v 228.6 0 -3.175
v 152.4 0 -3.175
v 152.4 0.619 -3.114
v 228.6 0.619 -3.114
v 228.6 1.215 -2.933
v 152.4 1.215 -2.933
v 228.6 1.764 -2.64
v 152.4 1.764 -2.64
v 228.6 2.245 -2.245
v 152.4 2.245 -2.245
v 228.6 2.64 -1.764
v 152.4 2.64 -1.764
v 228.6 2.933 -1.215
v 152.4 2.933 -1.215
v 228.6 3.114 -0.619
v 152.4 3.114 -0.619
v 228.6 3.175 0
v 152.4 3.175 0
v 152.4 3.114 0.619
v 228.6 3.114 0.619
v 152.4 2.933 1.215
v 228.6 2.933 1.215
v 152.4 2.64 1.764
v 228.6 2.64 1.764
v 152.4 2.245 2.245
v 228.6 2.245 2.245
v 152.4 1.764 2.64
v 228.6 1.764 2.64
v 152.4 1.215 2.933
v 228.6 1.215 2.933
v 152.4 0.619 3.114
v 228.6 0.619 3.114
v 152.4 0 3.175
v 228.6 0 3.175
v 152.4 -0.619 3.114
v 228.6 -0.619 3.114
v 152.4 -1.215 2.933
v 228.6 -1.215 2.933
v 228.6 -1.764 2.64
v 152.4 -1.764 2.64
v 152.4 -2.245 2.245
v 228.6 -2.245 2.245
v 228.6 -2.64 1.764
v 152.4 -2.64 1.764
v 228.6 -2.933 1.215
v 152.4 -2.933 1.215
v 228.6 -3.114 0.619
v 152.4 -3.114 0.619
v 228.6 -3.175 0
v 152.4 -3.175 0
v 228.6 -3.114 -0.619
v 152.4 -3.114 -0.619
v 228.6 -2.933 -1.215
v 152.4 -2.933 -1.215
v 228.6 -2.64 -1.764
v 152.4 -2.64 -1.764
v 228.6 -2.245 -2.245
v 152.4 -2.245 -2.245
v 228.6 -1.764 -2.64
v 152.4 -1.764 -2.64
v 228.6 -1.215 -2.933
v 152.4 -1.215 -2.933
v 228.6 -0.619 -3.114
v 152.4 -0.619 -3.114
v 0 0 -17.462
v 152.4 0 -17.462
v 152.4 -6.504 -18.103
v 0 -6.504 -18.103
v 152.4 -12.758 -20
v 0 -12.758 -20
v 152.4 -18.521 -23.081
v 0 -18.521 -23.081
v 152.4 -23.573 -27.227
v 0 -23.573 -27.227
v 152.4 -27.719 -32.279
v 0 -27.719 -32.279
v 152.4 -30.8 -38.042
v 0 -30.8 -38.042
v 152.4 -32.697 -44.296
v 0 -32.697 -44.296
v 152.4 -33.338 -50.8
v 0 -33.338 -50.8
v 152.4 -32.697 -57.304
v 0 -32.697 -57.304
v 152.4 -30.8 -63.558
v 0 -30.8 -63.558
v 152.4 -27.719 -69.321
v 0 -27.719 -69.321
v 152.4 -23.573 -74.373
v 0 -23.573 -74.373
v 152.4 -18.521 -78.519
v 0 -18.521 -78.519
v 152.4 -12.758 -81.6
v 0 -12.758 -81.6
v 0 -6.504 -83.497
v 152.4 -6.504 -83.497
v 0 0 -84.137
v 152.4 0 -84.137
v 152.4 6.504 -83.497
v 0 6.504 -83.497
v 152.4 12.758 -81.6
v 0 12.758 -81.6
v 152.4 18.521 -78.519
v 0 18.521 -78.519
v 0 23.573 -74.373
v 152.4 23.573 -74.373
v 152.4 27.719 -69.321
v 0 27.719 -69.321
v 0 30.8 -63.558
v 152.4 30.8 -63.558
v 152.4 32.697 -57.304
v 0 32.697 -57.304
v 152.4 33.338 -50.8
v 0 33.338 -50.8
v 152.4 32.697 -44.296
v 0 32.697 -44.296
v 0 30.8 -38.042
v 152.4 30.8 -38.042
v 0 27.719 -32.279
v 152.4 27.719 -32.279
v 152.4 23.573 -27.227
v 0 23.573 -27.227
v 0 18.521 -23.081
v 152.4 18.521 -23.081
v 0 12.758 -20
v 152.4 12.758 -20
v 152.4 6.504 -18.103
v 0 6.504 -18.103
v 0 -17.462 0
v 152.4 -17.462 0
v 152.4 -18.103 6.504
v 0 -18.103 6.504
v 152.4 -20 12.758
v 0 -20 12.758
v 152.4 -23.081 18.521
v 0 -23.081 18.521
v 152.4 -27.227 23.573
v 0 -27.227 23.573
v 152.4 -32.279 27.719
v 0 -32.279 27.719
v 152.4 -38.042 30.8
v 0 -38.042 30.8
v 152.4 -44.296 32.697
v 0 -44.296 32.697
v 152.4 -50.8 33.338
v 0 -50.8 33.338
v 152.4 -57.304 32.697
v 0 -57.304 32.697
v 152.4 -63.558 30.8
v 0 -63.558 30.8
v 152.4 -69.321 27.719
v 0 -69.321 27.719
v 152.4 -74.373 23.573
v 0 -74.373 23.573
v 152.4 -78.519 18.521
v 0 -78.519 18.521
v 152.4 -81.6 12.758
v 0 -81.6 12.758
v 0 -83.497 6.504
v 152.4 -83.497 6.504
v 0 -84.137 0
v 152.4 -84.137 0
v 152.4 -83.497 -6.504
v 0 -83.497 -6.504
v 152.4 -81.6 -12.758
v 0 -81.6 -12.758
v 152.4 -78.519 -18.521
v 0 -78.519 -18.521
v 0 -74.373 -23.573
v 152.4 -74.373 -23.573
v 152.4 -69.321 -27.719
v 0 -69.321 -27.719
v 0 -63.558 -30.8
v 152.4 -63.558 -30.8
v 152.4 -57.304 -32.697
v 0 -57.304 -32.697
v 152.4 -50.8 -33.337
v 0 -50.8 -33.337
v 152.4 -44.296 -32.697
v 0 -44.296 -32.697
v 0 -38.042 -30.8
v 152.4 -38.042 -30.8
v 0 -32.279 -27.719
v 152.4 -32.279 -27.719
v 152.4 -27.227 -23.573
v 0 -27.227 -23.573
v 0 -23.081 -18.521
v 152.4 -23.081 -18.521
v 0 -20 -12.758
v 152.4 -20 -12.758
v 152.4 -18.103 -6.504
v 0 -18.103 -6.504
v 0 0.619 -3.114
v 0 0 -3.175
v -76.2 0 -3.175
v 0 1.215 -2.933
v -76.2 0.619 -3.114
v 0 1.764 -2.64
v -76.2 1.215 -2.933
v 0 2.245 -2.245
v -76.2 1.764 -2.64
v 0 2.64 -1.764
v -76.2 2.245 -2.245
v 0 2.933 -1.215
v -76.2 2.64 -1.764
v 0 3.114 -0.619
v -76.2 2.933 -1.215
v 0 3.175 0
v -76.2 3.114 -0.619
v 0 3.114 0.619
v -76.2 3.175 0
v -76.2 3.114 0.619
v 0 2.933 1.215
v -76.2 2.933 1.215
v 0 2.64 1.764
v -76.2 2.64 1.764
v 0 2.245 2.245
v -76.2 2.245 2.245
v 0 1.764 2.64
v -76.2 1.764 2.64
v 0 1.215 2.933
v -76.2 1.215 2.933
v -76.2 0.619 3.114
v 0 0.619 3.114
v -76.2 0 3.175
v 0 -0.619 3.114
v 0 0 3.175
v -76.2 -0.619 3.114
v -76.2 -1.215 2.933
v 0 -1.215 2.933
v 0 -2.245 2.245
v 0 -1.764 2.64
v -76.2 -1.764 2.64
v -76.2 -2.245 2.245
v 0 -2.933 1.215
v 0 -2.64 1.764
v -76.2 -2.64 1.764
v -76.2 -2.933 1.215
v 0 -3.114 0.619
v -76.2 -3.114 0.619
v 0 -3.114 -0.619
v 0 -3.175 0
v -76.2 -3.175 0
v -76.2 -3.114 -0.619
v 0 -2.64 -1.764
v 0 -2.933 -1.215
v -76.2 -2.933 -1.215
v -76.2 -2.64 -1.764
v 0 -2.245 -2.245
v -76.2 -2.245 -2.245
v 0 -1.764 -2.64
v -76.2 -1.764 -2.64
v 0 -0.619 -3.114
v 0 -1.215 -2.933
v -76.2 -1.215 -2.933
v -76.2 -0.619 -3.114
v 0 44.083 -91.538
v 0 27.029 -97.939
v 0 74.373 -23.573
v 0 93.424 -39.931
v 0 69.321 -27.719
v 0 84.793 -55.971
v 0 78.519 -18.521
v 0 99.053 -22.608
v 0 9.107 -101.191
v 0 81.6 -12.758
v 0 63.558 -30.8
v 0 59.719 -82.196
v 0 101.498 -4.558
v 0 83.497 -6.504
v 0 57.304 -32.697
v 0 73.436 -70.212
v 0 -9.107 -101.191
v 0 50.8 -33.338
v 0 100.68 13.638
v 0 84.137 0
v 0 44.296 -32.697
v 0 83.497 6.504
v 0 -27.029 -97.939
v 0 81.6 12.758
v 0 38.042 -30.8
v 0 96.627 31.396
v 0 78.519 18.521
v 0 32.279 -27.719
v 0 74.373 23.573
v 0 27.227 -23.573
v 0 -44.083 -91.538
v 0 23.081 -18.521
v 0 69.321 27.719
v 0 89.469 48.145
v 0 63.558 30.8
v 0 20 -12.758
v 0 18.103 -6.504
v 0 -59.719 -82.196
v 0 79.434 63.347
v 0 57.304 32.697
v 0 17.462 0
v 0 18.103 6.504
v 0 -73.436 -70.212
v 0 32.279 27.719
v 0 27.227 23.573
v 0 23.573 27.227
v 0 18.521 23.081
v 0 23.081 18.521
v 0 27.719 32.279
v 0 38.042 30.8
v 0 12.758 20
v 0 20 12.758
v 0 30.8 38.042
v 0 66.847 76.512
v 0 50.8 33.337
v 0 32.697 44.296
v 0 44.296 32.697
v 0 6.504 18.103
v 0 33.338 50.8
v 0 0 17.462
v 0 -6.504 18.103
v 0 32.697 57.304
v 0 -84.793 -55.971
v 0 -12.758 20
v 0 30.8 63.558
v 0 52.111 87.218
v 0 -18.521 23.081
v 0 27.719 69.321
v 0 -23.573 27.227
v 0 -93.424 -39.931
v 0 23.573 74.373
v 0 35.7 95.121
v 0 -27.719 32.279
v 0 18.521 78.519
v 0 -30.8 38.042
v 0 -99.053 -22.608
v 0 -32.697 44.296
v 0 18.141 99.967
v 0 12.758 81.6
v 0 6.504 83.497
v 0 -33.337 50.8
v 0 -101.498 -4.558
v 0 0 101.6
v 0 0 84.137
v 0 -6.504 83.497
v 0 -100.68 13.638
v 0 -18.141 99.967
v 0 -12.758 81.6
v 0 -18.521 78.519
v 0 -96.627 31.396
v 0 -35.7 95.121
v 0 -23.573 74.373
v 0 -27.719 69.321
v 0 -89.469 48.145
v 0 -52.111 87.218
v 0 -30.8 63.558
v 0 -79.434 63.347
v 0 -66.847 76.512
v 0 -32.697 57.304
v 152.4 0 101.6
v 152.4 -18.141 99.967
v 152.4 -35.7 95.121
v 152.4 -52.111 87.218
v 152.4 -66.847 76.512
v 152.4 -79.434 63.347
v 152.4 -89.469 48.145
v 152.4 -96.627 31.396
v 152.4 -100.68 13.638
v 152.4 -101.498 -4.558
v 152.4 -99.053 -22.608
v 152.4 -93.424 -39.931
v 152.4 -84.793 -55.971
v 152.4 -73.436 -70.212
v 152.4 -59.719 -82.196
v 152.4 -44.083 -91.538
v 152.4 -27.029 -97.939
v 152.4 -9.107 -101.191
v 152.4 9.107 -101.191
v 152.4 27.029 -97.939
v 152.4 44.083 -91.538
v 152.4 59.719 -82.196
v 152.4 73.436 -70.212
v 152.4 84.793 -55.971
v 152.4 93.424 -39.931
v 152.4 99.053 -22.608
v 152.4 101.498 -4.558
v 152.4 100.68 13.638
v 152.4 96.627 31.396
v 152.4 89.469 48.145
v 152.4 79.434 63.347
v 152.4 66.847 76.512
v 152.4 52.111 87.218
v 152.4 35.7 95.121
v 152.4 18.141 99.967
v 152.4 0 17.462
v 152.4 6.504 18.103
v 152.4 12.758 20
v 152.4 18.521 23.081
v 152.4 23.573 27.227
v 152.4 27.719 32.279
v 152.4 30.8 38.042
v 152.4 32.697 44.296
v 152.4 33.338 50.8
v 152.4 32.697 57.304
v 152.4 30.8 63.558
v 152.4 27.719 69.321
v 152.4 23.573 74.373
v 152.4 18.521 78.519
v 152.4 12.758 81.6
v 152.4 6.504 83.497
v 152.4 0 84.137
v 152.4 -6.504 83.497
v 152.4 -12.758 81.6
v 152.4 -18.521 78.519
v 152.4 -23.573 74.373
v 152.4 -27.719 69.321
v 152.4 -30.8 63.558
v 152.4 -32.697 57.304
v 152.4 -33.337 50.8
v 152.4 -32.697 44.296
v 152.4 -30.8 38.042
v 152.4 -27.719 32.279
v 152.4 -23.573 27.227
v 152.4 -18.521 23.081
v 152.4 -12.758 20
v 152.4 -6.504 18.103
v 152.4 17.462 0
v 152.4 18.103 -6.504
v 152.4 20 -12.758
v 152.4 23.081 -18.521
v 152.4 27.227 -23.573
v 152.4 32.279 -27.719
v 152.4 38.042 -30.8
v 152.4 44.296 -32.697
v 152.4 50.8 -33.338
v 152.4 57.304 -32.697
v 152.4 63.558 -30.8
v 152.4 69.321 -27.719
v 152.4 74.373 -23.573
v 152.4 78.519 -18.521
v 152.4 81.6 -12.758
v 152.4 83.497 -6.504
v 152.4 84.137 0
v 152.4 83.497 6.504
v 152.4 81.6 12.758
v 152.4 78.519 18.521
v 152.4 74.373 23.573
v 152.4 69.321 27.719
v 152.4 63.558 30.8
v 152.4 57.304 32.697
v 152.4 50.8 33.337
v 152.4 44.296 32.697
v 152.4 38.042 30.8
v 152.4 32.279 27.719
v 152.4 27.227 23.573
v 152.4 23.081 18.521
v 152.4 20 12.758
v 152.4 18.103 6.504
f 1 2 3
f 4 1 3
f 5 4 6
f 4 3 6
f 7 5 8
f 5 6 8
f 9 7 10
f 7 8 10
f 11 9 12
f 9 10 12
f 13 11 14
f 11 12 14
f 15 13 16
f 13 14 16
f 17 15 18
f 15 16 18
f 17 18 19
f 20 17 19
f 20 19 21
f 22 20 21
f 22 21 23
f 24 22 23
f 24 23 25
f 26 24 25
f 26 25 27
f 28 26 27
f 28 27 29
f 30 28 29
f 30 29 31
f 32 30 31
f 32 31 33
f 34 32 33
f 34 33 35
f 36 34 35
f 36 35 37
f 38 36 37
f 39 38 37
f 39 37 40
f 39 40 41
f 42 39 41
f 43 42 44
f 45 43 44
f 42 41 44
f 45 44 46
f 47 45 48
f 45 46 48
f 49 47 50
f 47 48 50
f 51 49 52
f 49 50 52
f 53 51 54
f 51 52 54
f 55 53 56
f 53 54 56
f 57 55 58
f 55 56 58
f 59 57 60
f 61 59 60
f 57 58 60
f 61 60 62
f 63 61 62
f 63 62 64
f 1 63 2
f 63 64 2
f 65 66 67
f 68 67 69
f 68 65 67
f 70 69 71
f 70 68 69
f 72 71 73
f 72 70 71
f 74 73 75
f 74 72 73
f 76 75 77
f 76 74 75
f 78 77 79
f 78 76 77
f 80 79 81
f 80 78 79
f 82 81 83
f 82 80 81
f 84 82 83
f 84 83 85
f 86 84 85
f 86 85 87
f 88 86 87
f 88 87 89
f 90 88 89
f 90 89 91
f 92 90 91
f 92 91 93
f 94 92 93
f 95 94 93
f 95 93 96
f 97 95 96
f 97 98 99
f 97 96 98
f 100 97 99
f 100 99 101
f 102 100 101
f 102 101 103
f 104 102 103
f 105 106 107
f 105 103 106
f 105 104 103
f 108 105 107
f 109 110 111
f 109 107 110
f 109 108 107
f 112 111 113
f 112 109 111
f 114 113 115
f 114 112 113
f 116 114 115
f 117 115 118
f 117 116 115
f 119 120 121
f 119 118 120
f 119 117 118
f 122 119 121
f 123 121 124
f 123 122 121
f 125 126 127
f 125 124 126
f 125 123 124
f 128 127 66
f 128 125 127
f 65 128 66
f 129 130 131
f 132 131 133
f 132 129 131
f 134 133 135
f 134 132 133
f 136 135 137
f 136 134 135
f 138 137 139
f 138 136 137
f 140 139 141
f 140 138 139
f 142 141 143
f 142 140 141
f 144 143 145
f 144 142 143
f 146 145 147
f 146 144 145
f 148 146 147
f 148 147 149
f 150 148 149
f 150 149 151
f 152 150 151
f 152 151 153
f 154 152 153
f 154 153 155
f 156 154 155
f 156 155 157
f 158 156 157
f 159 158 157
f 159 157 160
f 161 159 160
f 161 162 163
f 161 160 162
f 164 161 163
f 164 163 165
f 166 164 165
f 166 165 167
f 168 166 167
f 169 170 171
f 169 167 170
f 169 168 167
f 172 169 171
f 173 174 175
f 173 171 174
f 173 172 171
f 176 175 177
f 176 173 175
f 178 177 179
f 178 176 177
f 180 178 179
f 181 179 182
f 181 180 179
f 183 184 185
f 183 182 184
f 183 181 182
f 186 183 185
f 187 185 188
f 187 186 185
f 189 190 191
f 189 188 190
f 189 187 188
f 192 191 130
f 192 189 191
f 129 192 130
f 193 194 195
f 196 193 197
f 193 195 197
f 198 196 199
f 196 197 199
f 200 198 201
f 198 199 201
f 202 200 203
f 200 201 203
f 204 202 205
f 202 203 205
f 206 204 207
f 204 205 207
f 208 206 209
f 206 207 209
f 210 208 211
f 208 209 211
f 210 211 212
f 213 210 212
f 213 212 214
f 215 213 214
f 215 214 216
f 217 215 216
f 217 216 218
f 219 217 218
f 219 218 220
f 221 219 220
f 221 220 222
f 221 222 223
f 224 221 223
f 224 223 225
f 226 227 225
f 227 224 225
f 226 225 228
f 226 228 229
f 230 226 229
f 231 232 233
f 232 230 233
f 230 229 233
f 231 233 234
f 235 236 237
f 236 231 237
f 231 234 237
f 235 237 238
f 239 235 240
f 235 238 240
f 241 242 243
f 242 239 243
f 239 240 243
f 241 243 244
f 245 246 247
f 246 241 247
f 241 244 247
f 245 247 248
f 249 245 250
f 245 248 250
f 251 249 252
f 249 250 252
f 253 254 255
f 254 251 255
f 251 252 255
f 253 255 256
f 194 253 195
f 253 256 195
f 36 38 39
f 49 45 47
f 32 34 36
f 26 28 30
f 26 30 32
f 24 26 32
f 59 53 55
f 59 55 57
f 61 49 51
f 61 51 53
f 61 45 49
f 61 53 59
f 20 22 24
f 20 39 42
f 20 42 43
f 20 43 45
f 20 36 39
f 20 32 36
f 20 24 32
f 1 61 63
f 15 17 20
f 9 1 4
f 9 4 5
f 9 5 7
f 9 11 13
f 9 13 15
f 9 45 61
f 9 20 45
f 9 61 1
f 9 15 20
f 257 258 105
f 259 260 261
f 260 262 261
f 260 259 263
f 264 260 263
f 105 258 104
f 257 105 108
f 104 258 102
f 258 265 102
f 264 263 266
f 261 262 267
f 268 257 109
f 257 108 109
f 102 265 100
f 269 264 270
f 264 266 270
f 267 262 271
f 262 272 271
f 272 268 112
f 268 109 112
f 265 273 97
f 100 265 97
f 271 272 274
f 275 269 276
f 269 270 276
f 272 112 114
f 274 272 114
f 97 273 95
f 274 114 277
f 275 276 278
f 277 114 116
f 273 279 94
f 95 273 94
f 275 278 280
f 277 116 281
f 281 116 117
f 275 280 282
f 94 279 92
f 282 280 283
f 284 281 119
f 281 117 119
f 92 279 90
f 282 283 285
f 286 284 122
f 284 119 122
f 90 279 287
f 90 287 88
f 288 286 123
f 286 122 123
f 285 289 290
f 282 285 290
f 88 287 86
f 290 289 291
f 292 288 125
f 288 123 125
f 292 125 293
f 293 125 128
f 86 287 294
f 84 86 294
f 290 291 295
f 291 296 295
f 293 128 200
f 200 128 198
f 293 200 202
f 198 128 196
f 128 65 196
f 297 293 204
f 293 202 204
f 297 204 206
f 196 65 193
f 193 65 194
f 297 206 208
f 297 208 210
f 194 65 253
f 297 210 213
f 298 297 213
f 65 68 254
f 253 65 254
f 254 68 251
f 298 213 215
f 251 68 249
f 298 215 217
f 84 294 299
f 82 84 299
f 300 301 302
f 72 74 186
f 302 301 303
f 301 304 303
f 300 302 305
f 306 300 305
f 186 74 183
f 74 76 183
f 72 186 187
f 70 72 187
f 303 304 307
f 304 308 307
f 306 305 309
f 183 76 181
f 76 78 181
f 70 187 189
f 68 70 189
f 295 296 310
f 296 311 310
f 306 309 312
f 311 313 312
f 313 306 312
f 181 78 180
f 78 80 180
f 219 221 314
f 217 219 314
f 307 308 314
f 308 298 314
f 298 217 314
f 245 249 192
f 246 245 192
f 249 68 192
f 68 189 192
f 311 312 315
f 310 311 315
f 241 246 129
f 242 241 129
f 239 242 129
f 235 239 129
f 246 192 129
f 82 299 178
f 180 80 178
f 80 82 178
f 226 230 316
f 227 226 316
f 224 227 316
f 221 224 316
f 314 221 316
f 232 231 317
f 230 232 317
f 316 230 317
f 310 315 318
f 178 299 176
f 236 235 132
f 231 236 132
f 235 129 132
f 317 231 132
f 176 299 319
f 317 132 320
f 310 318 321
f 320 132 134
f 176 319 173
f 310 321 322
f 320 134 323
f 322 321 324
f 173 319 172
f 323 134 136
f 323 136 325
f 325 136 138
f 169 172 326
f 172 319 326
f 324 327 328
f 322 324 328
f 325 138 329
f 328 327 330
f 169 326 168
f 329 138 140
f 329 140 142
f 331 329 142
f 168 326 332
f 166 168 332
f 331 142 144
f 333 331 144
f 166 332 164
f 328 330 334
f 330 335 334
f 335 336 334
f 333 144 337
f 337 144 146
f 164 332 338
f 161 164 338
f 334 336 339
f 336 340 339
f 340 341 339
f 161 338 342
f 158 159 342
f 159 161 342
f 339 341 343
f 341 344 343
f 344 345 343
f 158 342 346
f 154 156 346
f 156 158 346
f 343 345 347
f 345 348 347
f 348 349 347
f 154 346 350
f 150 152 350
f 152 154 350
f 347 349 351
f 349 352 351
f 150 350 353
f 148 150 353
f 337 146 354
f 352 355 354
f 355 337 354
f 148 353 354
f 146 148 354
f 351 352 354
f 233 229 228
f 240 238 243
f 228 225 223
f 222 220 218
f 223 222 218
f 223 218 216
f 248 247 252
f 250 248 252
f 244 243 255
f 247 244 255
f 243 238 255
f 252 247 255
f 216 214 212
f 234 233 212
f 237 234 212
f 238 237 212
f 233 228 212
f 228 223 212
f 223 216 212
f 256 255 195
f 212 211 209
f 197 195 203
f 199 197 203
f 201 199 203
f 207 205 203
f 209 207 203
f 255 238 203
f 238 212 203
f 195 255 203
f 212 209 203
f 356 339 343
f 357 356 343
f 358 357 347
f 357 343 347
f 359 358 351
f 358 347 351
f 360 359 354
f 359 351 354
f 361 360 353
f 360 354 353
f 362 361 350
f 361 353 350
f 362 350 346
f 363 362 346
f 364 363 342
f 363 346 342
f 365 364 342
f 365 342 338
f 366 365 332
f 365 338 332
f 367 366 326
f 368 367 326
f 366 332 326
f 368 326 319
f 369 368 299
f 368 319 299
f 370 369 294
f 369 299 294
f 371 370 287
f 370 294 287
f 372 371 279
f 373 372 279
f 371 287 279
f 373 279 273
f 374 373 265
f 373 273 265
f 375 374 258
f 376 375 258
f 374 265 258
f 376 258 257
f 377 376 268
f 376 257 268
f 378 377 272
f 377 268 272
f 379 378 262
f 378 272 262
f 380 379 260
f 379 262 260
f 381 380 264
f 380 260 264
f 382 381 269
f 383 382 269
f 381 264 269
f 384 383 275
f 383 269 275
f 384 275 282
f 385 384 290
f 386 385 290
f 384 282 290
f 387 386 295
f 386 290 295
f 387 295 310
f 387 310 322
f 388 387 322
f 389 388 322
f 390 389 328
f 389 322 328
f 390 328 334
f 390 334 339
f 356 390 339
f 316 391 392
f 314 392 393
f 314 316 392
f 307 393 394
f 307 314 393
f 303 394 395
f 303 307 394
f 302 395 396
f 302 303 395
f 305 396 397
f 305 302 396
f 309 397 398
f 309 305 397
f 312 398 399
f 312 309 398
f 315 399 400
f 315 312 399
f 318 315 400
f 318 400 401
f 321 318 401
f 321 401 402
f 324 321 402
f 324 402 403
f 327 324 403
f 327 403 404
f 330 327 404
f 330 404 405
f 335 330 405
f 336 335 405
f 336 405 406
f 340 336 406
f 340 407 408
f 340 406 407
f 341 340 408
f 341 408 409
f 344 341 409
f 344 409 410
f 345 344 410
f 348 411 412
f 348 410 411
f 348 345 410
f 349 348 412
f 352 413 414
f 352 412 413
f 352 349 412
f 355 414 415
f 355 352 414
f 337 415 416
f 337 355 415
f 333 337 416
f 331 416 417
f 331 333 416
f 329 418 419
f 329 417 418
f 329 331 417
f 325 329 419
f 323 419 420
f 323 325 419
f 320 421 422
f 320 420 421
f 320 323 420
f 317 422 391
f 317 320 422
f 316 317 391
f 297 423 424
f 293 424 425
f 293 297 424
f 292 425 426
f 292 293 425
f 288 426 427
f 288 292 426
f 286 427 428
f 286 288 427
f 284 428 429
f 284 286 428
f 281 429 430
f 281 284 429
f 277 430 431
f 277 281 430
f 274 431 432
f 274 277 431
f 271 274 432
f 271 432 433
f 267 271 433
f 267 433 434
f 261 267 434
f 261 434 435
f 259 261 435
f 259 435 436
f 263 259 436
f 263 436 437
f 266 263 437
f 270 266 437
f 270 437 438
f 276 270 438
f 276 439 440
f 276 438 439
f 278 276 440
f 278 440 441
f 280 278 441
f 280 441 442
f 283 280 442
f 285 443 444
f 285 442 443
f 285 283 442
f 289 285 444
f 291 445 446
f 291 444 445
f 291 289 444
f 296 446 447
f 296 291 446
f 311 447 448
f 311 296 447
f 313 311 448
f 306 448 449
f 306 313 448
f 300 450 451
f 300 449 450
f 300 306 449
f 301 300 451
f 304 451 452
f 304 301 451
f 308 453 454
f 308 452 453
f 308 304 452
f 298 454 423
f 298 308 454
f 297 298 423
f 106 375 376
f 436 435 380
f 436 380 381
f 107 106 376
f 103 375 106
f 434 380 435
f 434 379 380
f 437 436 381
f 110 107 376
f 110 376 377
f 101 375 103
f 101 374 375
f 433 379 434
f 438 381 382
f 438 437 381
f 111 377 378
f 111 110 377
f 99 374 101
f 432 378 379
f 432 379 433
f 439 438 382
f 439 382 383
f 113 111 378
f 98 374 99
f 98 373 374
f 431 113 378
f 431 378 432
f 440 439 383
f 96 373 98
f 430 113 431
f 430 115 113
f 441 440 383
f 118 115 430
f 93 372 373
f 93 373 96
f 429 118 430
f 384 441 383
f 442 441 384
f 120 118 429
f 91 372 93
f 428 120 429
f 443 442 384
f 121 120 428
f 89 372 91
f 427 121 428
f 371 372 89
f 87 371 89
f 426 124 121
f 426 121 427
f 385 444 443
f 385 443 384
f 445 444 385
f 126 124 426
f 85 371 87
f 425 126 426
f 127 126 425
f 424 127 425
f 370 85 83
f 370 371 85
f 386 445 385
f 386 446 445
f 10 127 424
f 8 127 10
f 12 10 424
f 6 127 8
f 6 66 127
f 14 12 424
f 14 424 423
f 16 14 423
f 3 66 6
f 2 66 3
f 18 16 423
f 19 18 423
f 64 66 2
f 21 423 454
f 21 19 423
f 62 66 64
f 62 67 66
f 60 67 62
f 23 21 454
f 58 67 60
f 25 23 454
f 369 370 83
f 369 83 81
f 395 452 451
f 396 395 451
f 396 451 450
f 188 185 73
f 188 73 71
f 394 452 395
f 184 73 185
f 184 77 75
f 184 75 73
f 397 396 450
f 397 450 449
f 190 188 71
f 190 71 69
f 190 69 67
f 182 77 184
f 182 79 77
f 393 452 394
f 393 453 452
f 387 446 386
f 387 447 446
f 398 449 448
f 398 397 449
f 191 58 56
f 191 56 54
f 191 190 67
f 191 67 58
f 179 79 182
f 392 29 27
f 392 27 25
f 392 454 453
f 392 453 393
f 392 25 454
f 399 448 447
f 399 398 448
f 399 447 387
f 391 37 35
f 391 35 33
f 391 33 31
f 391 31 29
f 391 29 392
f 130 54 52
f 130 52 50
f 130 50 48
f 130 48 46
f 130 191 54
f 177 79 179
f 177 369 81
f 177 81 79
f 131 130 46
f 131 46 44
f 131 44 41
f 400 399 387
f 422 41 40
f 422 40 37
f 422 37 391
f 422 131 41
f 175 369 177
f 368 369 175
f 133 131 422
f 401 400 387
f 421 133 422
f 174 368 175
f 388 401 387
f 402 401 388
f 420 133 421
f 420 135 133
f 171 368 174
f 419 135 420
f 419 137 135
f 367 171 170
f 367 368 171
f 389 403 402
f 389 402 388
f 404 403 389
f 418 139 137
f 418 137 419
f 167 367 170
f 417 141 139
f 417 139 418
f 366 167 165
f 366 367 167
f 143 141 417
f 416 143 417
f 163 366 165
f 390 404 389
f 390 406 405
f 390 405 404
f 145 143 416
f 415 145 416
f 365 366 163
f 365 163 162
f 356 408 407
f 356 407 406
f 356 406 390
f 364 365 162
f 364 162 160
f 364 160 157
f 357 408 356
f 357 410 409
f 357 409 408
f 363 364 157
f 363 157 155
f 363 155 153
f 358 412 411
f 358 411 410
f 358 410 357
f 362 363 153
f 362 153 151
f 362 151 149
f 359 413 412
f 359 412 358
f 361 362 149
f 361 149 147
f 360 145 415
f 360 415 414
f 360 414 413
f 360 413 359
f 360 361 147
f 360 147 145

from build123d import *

# Parameters (mm, degrees)
SKETCH1_R                = 101.6
BOSS_EXTRUDE1_DEPTH      = 152.4
SKETCH3_R                = 33.3375
CUT_EXTRUDE1_DEPTH       = 210.453765781
CIRPATTERN1_COUNT        = 4
BOSS_EXTRUDE7_DEPTH      = 228.6
BOSS_EXTRUDE7_DEPTH_BACK = 76.2
SKETCH2_R                = 3.175


with BuildPart() as part:
    # Sketch1 → Boss-Extrude1 (new body)
    with BuildSketch(Plane(origin=(0, 0, 0), x_dir=(0, 0, -1), z_dir=(1, 0, 0))):
        with Locations(Location((0, 0, 0), (0, 0, 180))):
            Circle(SKETCH1_R)
    extrude(amount=BOSS_EXTRUDE1_DEPTH)

    # Sketch3 → Cut-Extrude1 (cut, through all)
    with BuildSketch(Plane(origin=(0, 0, 0), x_dir=(0, 0, -1), z_dir=(1, 0, 0))):
        with Locations(Location((50.8, 0, 0), (0, 0, 180))):
            Circle(SKETCH3_R)
    cut_extrude1 = extrude(amount=CUT_EXTRUDE1_DEPTH, mode=Mode.SUBTRACT)

    # CirPattern1: Cut-Extrude1 ×4 about axis
    cirpattern1_axis = Axis((0, 0, 0), (1, 0, 0))
    for i in range(1, CIRPATTERN1_COUNT):
        add(cut_extrude1.rotate(cirpattern1_axis, i * 360 / CIRPATTERN1_COUNT), mode=Mode.SUBTRACT)

    # Sketch2 → Boss-Extrude7 (add, two sides: drawn at the far end of the back side and taken through both)
    with BuildSketch(Plane(origin=(0, 0, 0), x_dir=(0, 0, -1), z_dir=(1, 0, 0)).offset(-BOSS_EXTRUDE7_DEPTH_BACK)):
        Circle(SKETCH2_R)
    extrude(amount=BOSS_EXTRUDE7_DEPTH + BOSS_EXTRUDE7_DEPTH_BACK)


solid = part.part
